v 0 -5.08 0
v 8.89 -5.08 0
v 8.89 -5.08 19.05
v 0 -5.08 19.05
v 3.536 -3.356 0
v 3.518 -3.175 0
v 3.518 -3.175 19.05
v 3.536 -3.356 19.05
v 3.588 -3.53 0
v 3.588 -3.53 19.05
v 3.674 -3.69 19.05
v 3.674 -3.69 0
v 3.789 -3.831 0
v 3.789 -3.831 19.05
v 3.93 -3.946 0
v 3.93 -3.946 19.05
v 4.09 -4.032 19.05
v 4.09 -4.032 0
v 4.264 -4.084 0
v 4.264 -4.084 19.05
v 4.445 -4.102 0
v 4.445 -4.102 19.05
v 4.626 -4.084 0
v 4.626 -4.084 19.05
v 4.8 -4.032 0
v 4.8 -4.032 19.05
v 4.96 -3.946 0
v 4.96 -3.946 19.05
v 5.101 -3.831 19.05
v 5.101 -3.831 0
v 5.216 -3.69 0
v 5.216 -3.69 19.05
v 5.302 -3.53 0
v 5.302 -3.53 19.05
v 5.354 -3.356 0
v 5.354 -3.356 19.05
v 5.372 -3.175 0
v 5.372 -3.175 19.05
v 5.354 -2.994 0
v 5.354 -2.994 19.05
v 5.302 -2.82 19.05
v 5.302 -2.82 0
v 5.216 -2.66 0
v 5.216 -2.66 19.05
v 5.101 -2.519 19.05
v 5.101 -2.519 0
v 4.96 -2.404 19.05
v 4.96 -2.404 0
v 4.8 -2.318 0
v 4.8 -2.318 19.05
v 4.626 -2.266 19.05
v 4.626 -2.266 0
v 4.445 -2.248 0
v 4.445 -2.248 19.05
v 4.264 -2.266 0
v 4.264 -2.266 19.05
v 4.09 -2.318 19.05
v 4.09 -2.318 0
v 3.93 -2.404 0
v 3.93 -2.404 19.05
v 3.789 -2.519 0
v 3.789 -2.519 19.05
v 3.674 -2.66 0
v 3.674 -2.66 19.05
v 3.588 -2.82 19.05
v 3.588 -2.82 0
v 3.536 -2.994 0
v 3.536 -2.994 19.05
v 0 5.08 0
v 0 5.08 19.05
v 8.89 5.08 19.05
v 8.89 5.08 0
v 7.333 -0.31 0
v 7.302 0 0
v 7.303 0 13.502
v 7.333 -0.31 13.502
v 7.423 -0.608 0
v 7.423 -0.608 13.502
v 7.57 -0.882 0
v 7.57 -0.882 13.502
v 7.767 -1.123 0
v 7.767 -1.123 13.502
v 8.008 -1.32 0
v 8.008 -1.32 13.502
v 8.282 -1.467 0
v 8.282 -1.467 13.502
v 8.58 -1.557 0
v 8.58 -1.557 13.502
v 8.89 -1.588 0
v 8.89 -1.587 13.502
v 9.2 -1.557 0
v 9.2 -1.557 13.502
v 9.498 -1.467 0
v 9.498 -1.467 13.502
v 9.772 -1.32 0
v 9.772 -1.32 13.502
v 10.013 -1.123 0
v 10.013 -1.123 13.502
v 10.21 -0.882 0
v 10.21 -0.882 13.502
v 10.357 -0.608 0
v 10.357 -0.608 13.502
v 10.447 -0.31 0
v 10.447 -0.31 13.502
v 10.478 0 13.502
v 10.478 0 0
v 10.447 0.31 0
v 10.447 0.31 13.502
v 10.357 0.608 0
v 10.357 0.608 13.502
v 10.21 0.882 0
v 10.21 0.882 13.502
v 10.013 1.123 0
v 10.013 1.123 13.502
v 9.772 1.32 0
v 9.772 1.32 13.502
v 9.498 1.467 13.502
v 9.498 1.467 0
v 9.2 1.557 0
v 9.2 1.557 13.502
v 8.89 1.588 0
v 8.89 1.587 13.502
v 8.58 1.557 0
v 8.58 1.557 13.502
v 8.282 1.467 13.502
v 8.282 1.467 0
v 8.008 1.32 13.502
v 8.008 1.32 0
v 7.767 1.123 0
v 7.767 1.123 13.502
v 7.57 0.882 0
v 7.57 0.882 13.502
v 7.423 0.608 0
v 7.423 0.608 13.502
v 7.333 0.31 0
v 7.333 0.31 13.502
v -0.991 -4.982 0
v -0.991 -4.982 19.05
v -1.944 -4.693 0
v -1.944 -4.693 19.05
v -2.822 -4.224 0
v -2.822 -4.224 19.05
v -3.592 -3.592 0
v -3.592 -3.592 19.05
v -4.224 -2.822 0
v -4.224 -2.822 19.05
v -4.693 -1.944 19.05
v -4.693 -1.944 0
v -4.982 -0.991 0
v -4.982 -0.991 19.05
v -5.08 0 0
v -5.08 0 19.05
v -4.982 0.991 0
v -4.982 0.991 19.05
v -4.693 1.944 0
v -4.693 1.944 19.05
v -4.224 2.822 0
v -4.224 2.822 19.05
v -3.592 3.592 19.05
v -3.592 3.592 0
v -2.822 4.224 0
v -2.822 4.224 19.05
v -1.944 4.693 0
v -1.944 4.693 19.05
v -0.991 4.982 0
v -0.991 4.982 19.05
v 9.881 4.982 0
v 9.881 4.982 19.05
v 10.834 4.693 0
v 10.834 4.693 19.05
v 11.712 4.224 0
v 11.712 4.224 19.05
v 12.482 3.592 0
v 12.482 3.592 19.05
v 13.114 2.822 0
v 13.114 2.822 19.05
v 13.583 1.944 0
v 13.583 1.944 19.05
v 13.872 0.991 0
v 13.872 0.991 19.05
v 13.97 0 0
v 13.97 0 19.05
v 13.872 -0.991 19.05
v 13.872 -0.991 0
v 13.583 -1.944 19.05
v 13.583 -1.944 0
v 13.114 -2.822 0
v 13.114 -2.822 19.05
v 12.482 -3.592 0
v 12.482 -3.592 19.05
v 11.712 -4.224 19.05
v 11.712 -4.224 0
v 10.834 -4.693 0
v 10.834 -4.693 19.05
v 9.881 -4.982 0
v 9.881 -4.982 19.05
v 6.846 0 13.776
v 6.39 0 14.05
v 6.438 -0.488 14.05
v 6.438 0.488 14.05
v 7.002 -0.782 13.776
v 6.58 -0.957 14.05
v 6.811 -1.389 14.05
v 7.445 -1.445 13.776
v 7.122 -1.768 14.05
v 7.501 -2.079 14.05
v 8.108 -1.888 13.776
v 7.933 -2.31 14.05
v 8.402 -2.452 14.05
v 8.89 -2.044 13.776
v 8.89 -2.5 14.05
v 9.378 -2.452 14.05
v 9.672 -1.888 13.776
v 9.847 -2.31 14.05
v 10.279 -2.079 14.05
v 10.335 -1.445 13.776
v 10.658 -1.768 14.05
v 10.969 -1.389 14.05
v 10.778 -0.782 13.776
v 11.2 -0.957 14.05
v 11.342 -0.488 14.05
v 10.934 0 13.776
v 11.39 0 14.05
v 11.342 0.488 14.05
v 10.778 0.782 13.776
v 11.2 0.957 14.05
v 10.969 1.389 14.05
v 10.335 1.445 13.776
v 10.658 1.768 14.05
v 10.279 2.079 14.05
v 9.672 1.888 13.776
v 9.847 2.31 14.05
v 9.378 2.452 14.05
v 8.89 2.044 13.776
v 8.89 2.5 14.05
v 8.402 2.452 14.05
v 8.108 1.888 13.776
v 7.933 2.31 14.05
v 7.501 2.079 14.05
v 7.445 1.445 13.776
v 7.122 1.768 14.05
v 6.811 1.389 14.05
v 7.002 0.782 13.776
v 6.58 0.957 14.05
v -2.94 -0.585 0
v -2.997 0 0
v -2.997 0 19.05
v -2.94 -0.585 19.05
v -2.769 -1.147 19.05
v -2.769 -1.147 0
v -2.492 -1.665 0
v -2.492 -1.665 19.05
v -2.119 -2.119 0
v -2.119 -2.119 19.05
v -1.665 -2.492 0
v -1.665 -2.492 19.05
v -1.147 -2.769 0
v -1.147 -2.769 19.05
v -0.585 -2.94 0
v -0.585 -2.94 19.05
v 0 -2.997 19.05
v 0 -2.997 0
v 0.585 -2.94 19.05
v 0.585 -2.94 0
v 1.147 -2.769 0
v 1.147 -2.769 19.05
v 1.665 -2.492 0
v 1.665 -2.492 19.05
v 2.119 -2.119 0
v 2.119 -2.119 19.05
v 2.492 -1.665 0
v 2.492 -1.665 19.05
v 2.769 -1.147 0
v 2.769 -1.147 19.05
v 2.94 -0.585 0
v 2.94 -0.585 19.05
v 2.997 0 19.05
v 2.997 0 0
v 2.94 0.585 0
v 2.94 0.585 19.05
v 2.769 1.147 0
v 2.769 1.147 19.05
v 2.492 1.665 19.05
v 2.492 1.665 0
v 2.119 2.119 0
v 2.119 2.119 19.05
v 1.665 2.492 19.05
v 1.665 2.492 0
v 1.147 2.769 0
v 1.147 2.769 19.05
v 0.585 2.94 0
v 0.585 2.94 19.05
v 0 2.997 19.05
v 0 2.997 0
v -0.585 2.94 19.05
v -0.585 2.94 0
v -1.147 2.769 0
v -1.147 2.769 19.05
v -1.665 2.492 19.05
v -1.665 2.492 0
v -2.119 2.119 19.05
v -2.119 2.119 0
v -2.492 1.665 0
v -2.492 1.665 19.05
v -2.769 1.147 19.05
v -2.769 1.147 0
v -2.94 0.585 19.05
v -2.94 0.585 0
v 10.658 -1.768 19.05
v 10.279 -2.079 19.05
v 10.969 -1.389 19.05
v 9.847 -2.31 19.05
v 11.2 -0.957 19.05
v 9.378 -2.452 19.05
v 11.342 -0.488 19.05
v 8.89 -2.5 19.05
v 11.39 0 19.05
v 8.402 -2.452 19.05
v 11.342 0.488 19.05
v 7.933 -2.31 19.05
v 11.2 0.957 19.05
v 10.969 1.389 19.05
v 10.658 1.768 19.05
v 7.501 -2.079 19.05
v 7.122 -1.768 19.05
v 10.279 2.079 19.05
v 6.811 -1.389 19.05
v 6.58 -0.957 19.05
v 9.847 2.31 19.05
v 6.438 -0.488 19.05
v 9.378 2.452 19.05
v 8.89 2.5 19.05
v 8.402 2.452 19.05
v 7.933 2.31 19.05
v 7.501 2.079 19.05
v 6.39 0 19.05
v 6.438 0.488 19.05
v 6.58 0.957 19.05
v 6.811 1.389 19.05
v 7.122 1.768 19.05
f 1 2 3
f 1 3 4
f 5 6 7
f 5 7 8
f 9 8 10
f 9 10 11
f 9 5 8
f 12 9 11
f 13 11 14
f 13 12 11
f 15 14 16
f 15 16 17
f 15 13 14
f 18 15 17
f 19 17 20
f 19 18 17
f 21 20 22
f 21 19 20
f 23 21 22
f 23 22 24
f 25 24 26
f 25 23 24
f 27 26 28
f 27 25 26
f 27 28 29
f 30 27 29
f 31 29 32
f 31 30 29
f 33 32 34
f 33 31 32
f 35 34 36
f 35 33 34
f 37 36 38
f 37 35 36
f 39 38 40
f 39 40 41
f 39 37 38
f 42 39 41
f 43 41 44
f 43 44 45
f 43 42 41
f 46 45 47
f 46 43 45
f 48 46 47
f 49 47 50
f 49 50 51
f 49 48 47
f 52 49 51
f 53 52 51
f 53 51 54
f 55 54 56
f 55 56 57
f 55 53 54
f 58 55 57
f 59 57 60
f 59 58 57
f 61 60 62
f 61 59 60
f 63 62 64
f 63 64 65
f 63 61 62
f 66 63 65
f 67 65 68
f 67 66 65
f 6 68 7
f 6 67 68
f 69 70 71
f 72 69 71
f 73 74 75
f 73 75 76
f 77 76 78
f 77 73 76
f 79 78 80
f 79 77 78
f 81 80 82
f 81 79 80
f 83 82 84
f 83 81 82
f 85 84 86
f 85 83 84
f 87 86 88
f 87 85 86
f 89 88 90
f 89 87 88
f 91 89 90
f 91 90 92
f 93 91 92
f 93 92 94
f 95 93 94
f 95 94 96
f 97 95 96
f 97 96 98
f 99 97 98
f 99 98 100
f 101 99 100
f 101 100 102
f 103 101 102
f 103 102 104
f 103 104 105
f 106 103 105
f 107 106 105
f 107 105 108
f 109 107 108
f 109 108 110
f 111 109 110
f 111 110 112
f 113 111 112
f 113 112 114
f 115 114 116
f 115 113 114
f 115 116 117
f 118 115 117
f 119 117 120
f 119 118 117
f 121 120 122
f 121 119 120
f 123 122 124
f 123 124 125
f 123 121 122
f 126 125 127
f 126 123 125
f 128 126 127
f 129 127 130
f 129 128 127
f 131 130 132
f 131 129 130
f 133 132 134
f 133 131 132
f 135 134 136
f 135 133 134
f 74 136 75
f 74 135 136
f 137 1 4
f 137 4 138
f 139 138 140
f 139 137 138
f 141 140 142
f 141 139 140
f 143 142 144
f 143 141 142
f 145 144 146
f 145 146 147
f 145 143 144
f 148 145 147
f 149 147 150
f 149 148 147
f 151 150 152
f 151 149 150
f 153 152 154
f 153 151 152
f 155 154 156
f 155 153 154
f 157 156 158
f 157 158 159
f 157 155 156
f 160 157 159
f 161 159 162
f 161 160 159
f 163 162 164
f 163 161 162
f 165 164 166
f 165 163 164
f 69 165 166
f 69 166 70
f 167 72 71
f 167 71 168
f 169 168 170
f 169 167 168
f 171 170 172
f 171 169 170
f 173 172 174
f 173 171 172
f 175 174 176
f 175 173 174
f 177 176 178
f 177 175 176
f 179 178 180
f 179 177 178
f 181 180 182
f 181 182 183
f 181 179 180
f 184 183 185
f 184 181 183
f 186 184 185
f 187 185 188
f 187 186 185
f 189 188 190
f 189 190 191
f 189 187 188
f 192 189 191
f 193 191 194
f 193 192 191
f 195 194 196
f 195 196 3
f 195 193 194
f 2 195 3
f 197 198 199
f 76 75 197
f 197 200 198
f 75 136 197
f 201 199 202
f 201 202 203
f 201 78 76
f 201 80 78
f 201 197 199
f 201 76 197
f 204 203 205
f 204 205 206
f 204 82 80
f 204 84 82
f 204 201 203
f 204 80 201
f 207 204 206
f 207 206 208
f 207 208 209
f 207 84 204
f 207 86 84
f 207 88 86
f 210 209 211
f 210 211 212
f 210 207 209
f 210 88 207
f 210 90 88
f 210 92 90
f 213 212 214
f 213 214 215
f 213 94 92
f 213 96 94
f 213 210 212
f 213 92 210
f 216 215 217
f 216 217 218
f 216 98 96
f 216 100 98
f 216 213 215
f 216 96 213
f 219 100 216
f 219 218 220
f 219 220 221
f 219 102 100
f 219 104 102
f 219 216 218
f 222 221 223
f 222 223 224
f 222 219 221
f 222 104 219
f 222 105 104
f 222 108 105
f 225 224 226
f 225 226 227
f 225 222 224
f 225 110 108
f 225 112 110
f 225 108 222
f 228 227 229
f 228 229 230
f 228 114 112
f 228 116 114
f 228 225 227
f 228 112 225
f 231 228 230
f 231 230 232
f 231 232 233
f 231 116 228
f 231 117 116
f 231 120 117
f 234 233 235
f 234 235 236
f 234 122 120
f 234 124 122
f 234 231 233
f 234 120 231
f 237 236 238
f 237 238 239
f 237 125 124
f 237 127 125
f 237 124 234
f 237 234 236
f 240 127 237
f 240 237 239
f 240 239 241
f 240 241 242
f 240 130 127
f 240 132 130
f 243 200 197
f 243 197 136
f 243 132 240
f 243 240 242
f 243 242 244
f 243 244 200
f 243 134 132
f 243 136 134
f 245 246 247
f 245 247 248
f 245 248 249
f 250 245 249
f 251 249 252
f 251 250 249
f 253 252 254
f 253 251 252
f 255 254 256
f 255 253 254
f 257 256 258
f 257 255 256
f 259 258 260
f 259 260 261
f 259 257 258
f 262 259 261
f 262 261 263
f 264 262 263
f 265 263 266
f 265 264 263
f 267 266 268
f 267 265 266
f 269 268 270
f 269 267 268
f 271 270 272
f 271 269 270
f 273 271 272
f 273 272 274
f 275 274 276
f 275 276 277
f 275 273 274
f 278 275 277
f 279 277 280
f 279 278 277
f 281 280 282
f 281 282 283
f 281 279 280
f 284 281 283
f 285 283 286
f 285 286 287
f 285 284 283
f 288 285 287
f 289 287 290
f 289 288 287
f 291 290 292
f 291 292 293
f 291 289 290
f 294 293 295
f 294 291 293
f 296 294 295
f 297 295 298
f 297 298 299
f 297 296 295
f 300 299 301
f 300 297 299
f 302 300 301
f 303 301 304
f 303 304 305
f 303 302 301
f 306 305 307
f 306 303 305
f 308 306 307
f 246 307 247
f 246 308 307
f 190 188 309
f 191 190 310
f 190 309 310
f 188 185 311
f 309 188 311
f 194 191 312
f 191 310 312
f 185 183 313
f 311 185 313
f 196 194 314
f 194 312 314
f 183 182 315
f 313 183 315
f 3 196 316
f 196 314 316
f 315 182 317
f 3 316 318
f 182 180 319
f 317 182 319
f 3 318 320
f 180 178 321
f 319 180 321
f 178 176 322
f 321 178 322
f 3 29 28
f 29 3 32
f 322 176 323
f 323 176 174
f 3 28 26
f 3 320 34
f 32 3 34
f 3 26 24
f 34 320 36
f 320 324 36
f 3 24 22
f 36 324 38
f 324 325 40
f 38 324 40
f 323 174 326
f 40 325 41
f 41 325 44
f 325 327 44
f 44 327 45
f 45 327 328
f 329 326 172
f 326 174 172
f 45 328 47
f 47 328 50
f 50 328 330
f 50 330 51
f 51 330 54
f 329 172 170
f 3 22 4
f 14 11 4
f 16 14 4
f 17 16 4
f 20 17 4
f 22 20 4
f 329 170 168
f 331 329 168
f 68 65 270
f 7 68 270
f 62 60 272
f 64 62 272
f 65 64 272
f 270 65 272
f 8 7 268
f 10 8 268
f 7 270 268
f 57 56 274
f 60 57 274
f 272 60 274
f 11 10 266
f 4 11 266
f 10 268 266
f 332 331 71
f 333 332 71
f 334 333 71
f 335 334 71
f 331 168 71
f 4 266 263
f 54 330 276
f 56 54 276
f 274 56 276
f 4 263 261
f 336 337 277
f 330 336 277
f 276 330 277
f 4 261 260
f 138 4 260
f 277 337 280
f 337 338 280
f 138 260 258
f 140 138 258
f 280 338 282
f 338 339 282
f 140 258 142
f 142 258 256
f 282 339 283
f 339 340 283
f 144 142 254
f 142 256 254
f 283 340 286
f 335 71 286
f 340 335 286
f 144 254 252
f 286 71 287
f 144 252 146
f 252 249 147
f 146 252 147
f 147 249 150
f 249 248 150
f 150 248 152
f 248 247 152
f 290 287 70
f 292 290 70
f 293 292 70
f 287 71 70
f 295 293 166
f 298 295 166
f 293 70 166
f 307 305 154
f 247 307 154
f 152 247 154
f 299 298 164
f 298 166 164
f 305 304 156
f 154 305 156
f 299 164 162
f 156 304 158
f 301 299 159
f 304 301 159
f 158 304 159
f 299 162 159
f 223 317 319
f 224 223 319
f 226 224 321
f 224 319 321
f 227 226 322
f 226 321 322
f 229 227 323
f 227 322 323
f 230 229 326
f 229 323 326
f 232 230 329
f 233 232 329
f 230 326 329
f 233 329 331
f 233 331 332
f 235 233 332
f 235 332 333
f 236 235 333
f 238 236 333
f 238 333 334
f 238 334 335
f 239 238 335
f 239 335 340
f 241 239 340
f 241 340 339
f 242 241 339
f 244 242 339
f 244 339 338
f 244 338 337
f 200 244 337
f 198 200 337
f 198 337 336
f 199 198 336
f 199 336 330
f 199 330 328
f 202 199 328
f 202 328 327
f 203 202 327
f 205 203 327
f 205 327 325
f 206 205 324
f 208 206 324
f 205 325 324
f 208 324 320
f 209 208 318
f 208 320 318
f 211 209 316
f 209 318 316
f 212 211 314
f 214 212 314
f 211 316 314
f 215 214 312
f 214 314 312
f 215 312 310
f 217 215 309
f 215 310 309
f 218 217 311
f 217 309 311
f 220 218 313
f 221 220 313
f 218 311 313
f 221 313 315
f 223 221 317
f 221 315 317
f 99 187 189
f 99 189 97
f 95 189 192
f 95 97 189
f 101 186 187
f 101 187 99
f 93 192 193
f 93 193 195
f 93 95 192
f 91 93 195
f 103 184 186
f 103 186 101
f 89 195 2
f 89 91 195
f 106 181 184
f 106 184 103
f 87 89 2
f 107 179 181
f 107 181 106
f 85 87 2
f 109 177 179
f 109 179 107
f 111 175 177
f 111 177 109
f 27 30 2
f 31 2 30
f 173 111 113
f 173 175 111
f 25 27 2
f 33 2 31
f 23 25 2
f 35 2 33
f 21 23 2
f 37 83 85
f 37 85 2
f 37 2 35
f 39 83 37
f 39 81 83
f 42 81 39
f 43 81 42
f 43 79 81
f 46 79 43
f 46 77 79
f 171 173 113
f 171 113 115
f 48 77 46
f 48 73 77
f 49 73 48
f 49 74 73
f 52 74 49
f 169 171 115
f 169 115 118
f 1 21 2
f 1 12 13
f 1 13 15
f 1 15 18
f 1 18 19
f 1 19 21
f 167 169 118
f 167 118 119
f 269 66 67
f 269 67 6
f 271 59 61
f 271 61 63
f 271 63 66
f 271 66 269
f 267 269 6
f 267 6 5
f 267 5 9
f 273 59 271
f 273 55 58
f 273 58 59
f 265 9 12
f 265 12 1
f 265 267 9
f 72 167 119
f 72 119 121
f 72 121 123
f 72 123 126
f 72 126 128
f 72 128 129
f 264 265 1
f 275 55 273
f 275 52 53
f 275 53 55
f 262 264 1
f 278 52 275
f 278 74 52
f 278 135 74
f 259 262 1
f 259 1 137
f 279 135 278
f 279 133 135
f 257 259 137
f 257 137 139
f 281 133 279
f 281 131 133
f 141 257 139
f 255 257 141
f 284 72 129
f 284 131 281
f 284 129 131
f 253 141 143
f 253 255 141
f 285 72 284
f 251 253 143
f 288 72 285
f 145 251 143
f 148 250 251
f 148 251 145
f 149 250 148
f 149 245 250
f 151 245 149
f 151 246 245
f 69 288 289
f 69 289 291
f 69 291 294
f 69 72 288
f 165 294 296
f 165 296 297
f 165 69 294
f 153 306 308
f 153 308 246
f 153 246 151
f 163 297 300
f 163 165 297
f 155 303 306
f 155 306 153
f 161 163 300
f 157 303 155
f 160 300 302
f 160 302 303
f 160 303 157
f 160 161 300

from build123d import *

# Parameters (mm, degrees)
SKETCH1_R           = 2.9972
SKETCH1_R_2         = 1.5875
SKETCH1_R_3         = 0.9271
BOSS_EXTRUDE1_DEPTH = 19.05
SKETCH2_R           = 2.5
CUT_EXTRUDE1_DEPTH  = 5


with BuildPart() as part:
    # Sketch1 → Boss-Extrude1 (new body)
    with BuildSketch(Plane.XY):
        with BuildLine():
            Line((0, 5.08), (8.89, 5.08))
            ThreePointArc((8.89, 5.08), (13.97, 0), (8.89, -5.08))
            Line((8.89, -5.08), (0, -5.08))
            ThreePointArc((0, -5.08), (-5.08, 0), (0, 5.08))
        make_face()
        with Locations(Location((0, 0, 0), (0, 0, 180))):
            Circle(SKETCH1_R, mode=Mode.SUBTRACT)
        with Locations(Location((8.89, 0, 0), (0, 0, 180))):
            Circle(SKETCH1_R_2, mode=Mode.SUBTRACT)
        with Locations(Location((4.445, -3.175, 0), (0, 0, 180))):
            Circle(SKETCH1_R_3, mode=Mode.SUBTRACT)
    extrude(amount=BOSS_EXTRUDE1_DEPTH)

    # Sketch2 → Cut-Extrude1 (cut)
    with BuildSketch(Plane.XY.offset(19.05)):
        with Locations((8.89, 0)):
            Circle(SKETCH2_R)
    extrude(amount=-CUT_EXTRUDE1_DEPTH, mode=Mode.SUBTRACT)

    # Sketch3 → Cut-Revolve1 (revolve, cut)
    with BuildSketch(Plane(origin=(0, 0, 0), x_dir=(1, 0, 0), z_dir=(0, 1, 0)), mode=Mode.PRIVATE) as cut_revolve1_sk:
        Polygon((11.39, -14.05), (10.4775, -13.501714685), (10.4775, -14.05), align=None)
    revolve(cut_revolve1_sk.sketch.rotate(Axis((8.89, 0, 14.05), (0, 0, 1)), 180), axis=Axis((8.89, 0, 14.05), (0, 0, 1)), mode=Mode.SUBTRACT)


solid = part.part
